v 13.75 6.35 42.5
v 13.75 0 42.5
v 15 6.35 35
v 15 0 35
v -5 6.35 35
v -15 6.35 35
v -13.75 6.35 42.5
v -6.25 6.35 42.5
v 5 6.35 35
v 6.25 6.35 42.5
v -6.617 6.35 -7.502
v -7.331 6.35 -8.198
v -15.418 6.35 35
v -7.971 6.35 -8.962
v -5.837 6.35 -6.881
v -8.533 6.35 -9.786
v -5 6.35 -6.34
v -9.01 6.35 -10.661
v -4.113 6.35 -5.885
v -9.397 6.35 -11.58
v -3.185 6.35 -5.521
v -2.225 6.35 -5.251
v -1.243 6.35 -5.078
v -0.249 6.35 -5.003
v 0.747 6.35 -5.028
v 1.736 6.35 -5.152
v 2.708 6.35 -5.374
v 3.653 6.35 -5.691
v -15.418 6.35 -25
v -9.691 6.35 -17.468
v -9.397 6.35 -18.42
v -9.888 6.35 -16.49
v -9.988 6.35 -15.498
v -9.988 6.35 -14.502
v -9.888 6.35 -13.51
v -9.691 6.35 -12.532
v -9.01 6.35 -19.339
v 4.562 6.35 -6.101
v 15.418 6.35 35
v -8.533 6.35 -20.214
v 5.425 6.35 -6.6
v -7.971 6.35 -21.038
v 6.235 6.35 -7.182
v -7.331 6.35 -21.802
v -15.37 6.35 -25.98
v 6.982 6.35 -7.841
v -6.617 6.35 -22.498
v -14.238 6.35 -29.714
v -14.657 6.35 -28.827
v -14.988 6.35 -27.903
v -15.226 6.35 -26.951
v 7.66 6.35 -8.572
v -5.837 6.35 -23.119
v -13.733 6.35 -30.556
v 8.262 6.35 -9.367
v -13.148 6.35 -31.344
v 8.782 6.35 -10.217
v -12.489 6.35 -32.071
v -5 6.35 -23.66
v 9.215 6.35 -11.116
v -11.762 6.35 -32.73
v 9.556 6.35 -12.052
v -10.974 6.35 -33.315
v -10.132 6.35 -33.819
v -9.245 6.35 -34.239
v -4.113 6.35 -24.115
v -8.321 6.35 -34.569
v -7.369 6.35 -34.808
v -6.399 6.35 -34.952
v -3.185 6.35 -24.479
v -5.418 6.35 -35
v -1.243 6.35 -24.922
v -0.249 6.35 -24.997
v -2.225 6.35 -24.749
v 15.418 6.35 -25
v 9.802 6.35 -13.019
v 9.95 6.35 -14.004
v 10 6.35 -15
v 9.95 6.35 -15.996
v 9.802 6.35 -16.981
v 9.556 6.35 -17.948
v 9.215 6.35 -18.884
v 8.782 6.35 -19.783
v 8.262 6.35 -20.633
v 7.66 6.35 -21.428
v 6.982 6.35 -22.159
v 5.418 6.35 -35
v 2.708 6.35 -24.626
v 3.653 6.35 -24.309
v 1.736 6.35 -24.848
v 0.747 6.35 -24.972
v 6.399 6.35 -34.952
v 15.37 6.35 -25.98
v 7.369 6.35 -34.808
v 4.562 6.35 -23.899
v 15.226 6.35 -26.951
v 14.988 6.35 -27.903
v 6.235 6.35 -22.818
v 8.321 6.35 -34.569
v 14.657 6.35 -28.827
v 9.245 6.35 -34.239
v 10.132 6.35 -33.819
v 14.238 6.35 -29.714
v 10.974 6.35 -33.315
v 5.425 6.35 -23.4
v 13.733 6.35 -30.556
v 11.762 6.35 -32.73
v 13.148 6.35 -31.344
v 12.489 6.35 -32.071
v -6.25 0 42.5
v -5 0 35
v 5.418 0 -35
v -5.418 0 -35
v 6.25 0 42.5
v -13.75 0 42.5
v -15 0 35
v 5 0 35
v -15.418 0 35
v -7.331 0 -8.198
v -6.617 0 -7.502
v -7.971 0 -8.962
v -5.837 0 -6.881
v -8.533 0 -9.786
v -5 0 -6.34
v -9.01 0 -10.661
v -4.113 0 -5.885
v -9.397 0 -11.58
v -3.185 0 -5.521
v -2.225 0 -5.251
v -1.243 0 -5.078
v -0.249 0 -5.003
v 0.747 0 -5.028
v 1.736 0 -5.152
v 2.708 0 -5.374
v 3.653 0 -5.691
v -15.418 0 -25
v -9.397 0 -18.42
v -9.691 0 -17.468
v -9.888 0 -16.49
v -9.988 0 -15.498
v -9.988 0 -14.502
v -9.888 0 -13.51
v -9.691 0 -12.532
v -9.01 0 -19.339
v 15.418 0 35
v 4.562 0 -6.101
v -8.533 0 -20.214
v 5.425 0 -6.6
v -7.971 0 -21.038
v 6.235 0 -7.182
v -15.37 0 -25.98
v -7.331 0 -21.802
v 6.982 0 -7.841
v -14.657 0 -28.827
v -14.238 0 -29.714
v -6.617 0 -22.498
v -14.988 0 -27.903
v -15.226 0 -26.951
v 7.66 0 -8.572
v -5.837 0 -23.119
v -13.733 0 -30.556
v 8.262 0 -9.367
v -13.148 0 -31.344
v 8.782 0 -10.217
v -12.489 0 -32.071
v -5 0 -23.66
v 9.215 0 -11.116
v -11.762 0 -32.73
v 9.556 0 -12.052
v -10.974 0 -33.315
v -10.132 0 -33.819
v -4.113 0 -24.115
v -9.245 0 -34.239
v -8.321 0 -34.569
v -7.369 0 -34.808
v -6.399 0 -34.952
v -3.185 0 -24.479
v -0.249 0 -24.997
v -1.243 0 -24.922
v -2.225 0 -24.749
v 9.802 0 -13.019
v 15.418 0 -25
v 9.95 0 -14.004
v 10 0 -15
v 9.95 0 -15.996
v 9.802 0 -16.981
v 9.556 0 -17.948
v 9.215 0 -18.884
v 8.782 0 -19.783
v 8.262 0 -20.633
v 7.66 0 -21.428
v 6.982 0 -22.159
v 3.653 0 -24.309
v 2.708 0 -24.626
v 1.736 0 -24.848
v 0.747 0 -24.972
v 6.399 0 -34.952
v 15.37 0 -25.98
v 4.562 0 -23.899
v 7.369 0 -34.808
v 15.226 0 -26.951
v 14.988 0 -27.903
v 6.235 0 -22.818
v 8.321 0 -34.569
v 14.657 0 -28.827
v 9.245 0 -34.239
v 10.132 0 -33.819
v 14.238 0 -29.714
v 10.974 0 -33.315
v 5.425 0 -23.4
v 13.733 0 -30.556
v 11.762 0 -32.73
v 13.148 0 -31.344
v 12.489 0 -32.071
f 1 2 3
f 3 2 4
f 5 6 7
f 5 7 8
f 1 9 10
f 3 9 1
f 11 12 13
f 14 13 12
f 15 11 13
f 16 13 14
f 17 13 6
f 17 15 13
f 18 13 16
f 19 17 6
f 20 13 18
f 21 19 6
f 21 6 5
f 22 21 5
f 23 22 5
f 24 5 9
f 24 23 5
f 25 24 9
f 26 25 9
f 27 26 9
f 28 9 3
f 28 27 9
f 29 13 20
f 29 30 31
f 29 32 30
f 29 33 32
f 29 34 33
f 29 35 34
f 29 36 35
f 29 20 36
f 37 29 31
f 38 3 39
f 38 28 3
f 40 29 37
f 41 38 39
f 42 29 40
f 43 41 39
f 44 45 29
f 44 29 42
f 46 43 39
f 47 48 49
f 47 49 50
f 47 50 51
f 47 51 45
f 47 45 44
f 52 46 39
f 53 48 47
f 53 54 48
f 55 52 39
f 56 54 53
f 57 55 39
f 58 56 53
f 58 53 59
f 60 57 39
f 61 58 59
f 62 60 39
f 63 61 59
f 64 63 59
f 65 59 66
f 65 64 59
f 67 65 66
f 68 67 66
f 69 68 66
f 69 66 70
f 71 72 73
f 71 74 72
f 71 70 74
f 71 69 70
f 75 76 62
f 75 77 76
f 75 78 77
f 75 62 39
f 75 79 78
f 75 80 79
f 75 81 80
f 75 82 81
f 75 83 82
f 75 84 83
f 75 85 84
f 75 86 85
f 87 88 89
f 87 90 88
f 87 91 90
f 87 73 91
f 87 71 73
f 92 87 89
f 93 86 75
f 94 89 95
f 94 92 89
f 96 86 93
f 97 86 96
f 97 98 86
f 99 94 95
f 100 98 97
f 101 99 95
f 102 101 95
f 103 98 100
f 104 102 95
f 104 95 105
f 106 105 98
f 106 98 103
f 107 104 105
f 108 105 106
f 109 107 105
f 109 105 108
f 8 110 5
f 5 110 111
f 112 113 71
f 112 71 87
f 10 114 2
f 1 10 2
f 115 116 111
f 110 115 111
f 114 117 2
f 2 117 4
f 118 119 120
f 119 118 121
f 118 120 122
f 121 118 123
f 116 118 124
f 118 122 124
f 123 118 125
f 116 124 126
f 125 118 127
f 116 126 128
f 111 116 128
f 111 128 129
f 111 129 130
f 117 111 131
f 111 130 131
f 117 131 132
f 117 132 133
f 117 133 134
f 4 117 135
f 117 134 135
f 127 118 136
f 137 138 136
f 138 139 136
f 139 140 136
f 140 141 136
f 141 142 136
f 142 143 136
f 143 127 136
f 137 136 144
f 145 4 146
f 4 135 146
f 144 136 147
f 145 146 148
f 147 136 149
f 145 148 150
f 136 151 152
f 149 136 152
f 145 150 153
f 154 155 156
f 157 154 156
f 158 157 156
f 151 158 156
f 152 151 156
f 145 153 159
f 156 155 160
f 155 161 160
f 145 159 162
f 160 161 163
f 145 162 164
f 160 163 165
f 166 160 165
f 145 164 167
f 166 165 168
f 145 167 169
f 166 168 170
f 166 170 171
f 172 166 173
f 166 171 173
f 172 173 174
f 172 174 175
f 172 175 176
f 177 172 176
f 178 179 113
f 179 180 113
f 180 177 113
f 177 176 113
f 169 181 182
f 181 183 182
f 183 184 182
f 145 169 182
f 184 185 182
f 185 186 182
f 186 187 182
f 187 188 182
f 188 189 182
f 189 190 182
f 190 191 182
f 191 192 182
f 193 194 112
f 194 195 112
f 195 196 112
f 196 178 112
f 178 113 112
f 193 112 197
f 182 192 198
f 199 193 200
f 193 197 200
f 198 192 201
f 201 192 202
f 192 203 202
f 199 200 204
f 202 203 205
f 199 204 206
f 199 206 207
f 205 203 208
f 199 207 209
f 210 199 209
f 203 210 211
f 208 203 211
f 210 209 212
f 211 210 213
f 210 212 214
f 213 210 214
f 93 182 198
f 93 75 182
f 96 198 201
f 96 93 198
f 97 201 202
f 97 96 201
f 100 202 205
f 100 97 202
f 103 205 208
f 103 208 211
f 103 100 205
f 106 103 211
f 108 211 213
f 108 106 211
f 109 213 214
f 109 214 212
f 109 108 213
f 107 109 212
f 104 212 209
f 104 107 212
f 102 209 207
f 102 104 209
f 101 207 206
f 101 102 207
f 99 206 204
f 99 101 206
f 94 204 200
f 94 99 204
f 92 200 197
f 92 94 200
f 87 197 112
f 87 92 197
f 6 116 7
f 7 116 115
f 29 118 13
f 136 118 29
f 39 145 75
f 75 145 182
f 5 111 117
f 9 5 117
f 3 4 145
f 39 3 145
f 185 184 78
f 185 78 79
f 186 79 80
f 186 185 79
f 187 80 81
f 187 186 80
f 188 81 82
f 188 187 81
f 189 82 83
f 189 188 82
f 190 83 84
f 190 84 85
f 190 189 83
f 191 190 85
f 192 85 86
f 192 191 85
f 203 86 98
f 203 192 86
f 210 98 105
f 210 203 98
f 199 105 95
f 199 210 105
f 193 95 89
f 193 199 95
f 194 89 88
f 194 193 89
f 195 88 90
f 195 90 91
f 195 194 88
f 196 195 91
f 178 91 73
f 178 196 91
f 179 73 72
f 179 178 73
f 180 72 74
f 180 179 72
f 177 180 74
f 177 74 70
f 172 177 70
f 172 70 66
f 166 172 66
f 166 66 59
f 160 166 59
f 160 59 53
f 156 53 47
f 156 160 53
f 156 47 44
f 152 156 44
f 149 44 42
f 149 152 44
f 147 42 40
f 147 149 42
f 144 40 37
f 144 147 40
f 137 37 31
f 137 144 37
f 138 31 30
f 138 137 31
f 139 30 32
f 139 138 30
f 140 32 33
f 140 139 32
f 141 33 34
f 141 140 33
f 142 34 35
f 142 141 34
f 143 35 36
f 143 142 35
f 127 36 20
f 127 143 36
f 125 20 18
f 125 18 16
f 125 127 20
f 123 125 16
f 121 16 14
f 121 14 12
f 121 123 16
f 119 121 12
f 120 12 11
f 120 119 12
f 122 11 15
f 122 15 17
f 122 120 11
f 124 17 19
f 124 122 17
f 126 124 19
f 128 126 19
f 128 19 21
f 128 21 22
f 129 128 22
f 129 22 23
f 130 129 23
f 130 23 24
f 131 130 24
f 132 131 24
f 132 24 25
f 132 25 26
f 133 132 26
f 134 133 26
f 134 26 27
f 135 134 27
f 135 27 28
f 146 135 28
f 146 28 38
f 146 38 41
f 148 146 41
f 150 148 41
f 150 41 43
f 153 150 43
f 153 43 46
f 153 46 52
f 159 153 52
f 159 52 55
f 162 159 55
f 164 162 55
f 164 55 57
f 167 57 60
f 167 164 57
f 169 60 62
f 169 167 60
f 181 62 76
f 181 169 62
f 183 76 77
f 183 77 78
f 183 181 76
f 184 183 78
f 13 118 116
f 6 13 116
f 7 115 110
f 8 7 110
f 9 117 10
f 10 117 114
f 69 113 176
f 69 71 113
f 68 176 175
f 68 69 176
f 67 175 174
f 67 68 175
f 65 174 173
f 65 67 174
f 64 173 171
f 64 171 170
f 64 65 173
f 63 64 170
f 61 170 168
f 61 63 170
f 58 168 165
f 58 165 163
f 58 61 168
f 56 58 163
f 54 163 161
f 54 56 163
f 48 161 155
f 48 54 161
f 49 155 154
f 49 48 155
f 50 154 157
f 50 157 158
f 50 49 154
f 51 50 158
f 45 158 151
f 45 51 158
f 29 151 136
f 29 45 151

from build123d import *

# Parameters (mm, degrees)
SKETCH1_W           = 30.83672877
SKETCH1_H           = 70
SKETCH1_R           = 10
BOSS_EXTRUDE1_DEPTH = 6.35
FILLET1_R           = 10


with BuildPart() as part:
    # Sketch1 → Boss-Extrude1 (new body)
    with BuildSketch(Plane(origin=(0, 0, 0), x_dir=(1, 0, 0), z_dir=(0, 1, 0))):
        Polygon((13.75, -42.5), (15, -35), (5, -35), (6.25, -42.5), align=None)
        Polygon((-5, -35), (-15, -35), (-13.75, -42.5), (-6.25, -42.5), align=None)
        Rectangle(SKETCH1_W, SKETCH1_H)
        with Locations((0, 15)):
            Circle(SKETCH1_R, mode=Mode.SUBTRACT)
    extrude(amount=BOSS_EXTRUDE1_DEPTH)

    # Fillet1
    fillet1_edges = [part.edges().sort_by_distance(p)[0] for p in [
        (-15.418364385, 3.175, -35),
        (15.418364385, 3.175, -35),
    ]]
    fillet(fillet1_edges, radius=FILLET1_R)


solid = part.part
